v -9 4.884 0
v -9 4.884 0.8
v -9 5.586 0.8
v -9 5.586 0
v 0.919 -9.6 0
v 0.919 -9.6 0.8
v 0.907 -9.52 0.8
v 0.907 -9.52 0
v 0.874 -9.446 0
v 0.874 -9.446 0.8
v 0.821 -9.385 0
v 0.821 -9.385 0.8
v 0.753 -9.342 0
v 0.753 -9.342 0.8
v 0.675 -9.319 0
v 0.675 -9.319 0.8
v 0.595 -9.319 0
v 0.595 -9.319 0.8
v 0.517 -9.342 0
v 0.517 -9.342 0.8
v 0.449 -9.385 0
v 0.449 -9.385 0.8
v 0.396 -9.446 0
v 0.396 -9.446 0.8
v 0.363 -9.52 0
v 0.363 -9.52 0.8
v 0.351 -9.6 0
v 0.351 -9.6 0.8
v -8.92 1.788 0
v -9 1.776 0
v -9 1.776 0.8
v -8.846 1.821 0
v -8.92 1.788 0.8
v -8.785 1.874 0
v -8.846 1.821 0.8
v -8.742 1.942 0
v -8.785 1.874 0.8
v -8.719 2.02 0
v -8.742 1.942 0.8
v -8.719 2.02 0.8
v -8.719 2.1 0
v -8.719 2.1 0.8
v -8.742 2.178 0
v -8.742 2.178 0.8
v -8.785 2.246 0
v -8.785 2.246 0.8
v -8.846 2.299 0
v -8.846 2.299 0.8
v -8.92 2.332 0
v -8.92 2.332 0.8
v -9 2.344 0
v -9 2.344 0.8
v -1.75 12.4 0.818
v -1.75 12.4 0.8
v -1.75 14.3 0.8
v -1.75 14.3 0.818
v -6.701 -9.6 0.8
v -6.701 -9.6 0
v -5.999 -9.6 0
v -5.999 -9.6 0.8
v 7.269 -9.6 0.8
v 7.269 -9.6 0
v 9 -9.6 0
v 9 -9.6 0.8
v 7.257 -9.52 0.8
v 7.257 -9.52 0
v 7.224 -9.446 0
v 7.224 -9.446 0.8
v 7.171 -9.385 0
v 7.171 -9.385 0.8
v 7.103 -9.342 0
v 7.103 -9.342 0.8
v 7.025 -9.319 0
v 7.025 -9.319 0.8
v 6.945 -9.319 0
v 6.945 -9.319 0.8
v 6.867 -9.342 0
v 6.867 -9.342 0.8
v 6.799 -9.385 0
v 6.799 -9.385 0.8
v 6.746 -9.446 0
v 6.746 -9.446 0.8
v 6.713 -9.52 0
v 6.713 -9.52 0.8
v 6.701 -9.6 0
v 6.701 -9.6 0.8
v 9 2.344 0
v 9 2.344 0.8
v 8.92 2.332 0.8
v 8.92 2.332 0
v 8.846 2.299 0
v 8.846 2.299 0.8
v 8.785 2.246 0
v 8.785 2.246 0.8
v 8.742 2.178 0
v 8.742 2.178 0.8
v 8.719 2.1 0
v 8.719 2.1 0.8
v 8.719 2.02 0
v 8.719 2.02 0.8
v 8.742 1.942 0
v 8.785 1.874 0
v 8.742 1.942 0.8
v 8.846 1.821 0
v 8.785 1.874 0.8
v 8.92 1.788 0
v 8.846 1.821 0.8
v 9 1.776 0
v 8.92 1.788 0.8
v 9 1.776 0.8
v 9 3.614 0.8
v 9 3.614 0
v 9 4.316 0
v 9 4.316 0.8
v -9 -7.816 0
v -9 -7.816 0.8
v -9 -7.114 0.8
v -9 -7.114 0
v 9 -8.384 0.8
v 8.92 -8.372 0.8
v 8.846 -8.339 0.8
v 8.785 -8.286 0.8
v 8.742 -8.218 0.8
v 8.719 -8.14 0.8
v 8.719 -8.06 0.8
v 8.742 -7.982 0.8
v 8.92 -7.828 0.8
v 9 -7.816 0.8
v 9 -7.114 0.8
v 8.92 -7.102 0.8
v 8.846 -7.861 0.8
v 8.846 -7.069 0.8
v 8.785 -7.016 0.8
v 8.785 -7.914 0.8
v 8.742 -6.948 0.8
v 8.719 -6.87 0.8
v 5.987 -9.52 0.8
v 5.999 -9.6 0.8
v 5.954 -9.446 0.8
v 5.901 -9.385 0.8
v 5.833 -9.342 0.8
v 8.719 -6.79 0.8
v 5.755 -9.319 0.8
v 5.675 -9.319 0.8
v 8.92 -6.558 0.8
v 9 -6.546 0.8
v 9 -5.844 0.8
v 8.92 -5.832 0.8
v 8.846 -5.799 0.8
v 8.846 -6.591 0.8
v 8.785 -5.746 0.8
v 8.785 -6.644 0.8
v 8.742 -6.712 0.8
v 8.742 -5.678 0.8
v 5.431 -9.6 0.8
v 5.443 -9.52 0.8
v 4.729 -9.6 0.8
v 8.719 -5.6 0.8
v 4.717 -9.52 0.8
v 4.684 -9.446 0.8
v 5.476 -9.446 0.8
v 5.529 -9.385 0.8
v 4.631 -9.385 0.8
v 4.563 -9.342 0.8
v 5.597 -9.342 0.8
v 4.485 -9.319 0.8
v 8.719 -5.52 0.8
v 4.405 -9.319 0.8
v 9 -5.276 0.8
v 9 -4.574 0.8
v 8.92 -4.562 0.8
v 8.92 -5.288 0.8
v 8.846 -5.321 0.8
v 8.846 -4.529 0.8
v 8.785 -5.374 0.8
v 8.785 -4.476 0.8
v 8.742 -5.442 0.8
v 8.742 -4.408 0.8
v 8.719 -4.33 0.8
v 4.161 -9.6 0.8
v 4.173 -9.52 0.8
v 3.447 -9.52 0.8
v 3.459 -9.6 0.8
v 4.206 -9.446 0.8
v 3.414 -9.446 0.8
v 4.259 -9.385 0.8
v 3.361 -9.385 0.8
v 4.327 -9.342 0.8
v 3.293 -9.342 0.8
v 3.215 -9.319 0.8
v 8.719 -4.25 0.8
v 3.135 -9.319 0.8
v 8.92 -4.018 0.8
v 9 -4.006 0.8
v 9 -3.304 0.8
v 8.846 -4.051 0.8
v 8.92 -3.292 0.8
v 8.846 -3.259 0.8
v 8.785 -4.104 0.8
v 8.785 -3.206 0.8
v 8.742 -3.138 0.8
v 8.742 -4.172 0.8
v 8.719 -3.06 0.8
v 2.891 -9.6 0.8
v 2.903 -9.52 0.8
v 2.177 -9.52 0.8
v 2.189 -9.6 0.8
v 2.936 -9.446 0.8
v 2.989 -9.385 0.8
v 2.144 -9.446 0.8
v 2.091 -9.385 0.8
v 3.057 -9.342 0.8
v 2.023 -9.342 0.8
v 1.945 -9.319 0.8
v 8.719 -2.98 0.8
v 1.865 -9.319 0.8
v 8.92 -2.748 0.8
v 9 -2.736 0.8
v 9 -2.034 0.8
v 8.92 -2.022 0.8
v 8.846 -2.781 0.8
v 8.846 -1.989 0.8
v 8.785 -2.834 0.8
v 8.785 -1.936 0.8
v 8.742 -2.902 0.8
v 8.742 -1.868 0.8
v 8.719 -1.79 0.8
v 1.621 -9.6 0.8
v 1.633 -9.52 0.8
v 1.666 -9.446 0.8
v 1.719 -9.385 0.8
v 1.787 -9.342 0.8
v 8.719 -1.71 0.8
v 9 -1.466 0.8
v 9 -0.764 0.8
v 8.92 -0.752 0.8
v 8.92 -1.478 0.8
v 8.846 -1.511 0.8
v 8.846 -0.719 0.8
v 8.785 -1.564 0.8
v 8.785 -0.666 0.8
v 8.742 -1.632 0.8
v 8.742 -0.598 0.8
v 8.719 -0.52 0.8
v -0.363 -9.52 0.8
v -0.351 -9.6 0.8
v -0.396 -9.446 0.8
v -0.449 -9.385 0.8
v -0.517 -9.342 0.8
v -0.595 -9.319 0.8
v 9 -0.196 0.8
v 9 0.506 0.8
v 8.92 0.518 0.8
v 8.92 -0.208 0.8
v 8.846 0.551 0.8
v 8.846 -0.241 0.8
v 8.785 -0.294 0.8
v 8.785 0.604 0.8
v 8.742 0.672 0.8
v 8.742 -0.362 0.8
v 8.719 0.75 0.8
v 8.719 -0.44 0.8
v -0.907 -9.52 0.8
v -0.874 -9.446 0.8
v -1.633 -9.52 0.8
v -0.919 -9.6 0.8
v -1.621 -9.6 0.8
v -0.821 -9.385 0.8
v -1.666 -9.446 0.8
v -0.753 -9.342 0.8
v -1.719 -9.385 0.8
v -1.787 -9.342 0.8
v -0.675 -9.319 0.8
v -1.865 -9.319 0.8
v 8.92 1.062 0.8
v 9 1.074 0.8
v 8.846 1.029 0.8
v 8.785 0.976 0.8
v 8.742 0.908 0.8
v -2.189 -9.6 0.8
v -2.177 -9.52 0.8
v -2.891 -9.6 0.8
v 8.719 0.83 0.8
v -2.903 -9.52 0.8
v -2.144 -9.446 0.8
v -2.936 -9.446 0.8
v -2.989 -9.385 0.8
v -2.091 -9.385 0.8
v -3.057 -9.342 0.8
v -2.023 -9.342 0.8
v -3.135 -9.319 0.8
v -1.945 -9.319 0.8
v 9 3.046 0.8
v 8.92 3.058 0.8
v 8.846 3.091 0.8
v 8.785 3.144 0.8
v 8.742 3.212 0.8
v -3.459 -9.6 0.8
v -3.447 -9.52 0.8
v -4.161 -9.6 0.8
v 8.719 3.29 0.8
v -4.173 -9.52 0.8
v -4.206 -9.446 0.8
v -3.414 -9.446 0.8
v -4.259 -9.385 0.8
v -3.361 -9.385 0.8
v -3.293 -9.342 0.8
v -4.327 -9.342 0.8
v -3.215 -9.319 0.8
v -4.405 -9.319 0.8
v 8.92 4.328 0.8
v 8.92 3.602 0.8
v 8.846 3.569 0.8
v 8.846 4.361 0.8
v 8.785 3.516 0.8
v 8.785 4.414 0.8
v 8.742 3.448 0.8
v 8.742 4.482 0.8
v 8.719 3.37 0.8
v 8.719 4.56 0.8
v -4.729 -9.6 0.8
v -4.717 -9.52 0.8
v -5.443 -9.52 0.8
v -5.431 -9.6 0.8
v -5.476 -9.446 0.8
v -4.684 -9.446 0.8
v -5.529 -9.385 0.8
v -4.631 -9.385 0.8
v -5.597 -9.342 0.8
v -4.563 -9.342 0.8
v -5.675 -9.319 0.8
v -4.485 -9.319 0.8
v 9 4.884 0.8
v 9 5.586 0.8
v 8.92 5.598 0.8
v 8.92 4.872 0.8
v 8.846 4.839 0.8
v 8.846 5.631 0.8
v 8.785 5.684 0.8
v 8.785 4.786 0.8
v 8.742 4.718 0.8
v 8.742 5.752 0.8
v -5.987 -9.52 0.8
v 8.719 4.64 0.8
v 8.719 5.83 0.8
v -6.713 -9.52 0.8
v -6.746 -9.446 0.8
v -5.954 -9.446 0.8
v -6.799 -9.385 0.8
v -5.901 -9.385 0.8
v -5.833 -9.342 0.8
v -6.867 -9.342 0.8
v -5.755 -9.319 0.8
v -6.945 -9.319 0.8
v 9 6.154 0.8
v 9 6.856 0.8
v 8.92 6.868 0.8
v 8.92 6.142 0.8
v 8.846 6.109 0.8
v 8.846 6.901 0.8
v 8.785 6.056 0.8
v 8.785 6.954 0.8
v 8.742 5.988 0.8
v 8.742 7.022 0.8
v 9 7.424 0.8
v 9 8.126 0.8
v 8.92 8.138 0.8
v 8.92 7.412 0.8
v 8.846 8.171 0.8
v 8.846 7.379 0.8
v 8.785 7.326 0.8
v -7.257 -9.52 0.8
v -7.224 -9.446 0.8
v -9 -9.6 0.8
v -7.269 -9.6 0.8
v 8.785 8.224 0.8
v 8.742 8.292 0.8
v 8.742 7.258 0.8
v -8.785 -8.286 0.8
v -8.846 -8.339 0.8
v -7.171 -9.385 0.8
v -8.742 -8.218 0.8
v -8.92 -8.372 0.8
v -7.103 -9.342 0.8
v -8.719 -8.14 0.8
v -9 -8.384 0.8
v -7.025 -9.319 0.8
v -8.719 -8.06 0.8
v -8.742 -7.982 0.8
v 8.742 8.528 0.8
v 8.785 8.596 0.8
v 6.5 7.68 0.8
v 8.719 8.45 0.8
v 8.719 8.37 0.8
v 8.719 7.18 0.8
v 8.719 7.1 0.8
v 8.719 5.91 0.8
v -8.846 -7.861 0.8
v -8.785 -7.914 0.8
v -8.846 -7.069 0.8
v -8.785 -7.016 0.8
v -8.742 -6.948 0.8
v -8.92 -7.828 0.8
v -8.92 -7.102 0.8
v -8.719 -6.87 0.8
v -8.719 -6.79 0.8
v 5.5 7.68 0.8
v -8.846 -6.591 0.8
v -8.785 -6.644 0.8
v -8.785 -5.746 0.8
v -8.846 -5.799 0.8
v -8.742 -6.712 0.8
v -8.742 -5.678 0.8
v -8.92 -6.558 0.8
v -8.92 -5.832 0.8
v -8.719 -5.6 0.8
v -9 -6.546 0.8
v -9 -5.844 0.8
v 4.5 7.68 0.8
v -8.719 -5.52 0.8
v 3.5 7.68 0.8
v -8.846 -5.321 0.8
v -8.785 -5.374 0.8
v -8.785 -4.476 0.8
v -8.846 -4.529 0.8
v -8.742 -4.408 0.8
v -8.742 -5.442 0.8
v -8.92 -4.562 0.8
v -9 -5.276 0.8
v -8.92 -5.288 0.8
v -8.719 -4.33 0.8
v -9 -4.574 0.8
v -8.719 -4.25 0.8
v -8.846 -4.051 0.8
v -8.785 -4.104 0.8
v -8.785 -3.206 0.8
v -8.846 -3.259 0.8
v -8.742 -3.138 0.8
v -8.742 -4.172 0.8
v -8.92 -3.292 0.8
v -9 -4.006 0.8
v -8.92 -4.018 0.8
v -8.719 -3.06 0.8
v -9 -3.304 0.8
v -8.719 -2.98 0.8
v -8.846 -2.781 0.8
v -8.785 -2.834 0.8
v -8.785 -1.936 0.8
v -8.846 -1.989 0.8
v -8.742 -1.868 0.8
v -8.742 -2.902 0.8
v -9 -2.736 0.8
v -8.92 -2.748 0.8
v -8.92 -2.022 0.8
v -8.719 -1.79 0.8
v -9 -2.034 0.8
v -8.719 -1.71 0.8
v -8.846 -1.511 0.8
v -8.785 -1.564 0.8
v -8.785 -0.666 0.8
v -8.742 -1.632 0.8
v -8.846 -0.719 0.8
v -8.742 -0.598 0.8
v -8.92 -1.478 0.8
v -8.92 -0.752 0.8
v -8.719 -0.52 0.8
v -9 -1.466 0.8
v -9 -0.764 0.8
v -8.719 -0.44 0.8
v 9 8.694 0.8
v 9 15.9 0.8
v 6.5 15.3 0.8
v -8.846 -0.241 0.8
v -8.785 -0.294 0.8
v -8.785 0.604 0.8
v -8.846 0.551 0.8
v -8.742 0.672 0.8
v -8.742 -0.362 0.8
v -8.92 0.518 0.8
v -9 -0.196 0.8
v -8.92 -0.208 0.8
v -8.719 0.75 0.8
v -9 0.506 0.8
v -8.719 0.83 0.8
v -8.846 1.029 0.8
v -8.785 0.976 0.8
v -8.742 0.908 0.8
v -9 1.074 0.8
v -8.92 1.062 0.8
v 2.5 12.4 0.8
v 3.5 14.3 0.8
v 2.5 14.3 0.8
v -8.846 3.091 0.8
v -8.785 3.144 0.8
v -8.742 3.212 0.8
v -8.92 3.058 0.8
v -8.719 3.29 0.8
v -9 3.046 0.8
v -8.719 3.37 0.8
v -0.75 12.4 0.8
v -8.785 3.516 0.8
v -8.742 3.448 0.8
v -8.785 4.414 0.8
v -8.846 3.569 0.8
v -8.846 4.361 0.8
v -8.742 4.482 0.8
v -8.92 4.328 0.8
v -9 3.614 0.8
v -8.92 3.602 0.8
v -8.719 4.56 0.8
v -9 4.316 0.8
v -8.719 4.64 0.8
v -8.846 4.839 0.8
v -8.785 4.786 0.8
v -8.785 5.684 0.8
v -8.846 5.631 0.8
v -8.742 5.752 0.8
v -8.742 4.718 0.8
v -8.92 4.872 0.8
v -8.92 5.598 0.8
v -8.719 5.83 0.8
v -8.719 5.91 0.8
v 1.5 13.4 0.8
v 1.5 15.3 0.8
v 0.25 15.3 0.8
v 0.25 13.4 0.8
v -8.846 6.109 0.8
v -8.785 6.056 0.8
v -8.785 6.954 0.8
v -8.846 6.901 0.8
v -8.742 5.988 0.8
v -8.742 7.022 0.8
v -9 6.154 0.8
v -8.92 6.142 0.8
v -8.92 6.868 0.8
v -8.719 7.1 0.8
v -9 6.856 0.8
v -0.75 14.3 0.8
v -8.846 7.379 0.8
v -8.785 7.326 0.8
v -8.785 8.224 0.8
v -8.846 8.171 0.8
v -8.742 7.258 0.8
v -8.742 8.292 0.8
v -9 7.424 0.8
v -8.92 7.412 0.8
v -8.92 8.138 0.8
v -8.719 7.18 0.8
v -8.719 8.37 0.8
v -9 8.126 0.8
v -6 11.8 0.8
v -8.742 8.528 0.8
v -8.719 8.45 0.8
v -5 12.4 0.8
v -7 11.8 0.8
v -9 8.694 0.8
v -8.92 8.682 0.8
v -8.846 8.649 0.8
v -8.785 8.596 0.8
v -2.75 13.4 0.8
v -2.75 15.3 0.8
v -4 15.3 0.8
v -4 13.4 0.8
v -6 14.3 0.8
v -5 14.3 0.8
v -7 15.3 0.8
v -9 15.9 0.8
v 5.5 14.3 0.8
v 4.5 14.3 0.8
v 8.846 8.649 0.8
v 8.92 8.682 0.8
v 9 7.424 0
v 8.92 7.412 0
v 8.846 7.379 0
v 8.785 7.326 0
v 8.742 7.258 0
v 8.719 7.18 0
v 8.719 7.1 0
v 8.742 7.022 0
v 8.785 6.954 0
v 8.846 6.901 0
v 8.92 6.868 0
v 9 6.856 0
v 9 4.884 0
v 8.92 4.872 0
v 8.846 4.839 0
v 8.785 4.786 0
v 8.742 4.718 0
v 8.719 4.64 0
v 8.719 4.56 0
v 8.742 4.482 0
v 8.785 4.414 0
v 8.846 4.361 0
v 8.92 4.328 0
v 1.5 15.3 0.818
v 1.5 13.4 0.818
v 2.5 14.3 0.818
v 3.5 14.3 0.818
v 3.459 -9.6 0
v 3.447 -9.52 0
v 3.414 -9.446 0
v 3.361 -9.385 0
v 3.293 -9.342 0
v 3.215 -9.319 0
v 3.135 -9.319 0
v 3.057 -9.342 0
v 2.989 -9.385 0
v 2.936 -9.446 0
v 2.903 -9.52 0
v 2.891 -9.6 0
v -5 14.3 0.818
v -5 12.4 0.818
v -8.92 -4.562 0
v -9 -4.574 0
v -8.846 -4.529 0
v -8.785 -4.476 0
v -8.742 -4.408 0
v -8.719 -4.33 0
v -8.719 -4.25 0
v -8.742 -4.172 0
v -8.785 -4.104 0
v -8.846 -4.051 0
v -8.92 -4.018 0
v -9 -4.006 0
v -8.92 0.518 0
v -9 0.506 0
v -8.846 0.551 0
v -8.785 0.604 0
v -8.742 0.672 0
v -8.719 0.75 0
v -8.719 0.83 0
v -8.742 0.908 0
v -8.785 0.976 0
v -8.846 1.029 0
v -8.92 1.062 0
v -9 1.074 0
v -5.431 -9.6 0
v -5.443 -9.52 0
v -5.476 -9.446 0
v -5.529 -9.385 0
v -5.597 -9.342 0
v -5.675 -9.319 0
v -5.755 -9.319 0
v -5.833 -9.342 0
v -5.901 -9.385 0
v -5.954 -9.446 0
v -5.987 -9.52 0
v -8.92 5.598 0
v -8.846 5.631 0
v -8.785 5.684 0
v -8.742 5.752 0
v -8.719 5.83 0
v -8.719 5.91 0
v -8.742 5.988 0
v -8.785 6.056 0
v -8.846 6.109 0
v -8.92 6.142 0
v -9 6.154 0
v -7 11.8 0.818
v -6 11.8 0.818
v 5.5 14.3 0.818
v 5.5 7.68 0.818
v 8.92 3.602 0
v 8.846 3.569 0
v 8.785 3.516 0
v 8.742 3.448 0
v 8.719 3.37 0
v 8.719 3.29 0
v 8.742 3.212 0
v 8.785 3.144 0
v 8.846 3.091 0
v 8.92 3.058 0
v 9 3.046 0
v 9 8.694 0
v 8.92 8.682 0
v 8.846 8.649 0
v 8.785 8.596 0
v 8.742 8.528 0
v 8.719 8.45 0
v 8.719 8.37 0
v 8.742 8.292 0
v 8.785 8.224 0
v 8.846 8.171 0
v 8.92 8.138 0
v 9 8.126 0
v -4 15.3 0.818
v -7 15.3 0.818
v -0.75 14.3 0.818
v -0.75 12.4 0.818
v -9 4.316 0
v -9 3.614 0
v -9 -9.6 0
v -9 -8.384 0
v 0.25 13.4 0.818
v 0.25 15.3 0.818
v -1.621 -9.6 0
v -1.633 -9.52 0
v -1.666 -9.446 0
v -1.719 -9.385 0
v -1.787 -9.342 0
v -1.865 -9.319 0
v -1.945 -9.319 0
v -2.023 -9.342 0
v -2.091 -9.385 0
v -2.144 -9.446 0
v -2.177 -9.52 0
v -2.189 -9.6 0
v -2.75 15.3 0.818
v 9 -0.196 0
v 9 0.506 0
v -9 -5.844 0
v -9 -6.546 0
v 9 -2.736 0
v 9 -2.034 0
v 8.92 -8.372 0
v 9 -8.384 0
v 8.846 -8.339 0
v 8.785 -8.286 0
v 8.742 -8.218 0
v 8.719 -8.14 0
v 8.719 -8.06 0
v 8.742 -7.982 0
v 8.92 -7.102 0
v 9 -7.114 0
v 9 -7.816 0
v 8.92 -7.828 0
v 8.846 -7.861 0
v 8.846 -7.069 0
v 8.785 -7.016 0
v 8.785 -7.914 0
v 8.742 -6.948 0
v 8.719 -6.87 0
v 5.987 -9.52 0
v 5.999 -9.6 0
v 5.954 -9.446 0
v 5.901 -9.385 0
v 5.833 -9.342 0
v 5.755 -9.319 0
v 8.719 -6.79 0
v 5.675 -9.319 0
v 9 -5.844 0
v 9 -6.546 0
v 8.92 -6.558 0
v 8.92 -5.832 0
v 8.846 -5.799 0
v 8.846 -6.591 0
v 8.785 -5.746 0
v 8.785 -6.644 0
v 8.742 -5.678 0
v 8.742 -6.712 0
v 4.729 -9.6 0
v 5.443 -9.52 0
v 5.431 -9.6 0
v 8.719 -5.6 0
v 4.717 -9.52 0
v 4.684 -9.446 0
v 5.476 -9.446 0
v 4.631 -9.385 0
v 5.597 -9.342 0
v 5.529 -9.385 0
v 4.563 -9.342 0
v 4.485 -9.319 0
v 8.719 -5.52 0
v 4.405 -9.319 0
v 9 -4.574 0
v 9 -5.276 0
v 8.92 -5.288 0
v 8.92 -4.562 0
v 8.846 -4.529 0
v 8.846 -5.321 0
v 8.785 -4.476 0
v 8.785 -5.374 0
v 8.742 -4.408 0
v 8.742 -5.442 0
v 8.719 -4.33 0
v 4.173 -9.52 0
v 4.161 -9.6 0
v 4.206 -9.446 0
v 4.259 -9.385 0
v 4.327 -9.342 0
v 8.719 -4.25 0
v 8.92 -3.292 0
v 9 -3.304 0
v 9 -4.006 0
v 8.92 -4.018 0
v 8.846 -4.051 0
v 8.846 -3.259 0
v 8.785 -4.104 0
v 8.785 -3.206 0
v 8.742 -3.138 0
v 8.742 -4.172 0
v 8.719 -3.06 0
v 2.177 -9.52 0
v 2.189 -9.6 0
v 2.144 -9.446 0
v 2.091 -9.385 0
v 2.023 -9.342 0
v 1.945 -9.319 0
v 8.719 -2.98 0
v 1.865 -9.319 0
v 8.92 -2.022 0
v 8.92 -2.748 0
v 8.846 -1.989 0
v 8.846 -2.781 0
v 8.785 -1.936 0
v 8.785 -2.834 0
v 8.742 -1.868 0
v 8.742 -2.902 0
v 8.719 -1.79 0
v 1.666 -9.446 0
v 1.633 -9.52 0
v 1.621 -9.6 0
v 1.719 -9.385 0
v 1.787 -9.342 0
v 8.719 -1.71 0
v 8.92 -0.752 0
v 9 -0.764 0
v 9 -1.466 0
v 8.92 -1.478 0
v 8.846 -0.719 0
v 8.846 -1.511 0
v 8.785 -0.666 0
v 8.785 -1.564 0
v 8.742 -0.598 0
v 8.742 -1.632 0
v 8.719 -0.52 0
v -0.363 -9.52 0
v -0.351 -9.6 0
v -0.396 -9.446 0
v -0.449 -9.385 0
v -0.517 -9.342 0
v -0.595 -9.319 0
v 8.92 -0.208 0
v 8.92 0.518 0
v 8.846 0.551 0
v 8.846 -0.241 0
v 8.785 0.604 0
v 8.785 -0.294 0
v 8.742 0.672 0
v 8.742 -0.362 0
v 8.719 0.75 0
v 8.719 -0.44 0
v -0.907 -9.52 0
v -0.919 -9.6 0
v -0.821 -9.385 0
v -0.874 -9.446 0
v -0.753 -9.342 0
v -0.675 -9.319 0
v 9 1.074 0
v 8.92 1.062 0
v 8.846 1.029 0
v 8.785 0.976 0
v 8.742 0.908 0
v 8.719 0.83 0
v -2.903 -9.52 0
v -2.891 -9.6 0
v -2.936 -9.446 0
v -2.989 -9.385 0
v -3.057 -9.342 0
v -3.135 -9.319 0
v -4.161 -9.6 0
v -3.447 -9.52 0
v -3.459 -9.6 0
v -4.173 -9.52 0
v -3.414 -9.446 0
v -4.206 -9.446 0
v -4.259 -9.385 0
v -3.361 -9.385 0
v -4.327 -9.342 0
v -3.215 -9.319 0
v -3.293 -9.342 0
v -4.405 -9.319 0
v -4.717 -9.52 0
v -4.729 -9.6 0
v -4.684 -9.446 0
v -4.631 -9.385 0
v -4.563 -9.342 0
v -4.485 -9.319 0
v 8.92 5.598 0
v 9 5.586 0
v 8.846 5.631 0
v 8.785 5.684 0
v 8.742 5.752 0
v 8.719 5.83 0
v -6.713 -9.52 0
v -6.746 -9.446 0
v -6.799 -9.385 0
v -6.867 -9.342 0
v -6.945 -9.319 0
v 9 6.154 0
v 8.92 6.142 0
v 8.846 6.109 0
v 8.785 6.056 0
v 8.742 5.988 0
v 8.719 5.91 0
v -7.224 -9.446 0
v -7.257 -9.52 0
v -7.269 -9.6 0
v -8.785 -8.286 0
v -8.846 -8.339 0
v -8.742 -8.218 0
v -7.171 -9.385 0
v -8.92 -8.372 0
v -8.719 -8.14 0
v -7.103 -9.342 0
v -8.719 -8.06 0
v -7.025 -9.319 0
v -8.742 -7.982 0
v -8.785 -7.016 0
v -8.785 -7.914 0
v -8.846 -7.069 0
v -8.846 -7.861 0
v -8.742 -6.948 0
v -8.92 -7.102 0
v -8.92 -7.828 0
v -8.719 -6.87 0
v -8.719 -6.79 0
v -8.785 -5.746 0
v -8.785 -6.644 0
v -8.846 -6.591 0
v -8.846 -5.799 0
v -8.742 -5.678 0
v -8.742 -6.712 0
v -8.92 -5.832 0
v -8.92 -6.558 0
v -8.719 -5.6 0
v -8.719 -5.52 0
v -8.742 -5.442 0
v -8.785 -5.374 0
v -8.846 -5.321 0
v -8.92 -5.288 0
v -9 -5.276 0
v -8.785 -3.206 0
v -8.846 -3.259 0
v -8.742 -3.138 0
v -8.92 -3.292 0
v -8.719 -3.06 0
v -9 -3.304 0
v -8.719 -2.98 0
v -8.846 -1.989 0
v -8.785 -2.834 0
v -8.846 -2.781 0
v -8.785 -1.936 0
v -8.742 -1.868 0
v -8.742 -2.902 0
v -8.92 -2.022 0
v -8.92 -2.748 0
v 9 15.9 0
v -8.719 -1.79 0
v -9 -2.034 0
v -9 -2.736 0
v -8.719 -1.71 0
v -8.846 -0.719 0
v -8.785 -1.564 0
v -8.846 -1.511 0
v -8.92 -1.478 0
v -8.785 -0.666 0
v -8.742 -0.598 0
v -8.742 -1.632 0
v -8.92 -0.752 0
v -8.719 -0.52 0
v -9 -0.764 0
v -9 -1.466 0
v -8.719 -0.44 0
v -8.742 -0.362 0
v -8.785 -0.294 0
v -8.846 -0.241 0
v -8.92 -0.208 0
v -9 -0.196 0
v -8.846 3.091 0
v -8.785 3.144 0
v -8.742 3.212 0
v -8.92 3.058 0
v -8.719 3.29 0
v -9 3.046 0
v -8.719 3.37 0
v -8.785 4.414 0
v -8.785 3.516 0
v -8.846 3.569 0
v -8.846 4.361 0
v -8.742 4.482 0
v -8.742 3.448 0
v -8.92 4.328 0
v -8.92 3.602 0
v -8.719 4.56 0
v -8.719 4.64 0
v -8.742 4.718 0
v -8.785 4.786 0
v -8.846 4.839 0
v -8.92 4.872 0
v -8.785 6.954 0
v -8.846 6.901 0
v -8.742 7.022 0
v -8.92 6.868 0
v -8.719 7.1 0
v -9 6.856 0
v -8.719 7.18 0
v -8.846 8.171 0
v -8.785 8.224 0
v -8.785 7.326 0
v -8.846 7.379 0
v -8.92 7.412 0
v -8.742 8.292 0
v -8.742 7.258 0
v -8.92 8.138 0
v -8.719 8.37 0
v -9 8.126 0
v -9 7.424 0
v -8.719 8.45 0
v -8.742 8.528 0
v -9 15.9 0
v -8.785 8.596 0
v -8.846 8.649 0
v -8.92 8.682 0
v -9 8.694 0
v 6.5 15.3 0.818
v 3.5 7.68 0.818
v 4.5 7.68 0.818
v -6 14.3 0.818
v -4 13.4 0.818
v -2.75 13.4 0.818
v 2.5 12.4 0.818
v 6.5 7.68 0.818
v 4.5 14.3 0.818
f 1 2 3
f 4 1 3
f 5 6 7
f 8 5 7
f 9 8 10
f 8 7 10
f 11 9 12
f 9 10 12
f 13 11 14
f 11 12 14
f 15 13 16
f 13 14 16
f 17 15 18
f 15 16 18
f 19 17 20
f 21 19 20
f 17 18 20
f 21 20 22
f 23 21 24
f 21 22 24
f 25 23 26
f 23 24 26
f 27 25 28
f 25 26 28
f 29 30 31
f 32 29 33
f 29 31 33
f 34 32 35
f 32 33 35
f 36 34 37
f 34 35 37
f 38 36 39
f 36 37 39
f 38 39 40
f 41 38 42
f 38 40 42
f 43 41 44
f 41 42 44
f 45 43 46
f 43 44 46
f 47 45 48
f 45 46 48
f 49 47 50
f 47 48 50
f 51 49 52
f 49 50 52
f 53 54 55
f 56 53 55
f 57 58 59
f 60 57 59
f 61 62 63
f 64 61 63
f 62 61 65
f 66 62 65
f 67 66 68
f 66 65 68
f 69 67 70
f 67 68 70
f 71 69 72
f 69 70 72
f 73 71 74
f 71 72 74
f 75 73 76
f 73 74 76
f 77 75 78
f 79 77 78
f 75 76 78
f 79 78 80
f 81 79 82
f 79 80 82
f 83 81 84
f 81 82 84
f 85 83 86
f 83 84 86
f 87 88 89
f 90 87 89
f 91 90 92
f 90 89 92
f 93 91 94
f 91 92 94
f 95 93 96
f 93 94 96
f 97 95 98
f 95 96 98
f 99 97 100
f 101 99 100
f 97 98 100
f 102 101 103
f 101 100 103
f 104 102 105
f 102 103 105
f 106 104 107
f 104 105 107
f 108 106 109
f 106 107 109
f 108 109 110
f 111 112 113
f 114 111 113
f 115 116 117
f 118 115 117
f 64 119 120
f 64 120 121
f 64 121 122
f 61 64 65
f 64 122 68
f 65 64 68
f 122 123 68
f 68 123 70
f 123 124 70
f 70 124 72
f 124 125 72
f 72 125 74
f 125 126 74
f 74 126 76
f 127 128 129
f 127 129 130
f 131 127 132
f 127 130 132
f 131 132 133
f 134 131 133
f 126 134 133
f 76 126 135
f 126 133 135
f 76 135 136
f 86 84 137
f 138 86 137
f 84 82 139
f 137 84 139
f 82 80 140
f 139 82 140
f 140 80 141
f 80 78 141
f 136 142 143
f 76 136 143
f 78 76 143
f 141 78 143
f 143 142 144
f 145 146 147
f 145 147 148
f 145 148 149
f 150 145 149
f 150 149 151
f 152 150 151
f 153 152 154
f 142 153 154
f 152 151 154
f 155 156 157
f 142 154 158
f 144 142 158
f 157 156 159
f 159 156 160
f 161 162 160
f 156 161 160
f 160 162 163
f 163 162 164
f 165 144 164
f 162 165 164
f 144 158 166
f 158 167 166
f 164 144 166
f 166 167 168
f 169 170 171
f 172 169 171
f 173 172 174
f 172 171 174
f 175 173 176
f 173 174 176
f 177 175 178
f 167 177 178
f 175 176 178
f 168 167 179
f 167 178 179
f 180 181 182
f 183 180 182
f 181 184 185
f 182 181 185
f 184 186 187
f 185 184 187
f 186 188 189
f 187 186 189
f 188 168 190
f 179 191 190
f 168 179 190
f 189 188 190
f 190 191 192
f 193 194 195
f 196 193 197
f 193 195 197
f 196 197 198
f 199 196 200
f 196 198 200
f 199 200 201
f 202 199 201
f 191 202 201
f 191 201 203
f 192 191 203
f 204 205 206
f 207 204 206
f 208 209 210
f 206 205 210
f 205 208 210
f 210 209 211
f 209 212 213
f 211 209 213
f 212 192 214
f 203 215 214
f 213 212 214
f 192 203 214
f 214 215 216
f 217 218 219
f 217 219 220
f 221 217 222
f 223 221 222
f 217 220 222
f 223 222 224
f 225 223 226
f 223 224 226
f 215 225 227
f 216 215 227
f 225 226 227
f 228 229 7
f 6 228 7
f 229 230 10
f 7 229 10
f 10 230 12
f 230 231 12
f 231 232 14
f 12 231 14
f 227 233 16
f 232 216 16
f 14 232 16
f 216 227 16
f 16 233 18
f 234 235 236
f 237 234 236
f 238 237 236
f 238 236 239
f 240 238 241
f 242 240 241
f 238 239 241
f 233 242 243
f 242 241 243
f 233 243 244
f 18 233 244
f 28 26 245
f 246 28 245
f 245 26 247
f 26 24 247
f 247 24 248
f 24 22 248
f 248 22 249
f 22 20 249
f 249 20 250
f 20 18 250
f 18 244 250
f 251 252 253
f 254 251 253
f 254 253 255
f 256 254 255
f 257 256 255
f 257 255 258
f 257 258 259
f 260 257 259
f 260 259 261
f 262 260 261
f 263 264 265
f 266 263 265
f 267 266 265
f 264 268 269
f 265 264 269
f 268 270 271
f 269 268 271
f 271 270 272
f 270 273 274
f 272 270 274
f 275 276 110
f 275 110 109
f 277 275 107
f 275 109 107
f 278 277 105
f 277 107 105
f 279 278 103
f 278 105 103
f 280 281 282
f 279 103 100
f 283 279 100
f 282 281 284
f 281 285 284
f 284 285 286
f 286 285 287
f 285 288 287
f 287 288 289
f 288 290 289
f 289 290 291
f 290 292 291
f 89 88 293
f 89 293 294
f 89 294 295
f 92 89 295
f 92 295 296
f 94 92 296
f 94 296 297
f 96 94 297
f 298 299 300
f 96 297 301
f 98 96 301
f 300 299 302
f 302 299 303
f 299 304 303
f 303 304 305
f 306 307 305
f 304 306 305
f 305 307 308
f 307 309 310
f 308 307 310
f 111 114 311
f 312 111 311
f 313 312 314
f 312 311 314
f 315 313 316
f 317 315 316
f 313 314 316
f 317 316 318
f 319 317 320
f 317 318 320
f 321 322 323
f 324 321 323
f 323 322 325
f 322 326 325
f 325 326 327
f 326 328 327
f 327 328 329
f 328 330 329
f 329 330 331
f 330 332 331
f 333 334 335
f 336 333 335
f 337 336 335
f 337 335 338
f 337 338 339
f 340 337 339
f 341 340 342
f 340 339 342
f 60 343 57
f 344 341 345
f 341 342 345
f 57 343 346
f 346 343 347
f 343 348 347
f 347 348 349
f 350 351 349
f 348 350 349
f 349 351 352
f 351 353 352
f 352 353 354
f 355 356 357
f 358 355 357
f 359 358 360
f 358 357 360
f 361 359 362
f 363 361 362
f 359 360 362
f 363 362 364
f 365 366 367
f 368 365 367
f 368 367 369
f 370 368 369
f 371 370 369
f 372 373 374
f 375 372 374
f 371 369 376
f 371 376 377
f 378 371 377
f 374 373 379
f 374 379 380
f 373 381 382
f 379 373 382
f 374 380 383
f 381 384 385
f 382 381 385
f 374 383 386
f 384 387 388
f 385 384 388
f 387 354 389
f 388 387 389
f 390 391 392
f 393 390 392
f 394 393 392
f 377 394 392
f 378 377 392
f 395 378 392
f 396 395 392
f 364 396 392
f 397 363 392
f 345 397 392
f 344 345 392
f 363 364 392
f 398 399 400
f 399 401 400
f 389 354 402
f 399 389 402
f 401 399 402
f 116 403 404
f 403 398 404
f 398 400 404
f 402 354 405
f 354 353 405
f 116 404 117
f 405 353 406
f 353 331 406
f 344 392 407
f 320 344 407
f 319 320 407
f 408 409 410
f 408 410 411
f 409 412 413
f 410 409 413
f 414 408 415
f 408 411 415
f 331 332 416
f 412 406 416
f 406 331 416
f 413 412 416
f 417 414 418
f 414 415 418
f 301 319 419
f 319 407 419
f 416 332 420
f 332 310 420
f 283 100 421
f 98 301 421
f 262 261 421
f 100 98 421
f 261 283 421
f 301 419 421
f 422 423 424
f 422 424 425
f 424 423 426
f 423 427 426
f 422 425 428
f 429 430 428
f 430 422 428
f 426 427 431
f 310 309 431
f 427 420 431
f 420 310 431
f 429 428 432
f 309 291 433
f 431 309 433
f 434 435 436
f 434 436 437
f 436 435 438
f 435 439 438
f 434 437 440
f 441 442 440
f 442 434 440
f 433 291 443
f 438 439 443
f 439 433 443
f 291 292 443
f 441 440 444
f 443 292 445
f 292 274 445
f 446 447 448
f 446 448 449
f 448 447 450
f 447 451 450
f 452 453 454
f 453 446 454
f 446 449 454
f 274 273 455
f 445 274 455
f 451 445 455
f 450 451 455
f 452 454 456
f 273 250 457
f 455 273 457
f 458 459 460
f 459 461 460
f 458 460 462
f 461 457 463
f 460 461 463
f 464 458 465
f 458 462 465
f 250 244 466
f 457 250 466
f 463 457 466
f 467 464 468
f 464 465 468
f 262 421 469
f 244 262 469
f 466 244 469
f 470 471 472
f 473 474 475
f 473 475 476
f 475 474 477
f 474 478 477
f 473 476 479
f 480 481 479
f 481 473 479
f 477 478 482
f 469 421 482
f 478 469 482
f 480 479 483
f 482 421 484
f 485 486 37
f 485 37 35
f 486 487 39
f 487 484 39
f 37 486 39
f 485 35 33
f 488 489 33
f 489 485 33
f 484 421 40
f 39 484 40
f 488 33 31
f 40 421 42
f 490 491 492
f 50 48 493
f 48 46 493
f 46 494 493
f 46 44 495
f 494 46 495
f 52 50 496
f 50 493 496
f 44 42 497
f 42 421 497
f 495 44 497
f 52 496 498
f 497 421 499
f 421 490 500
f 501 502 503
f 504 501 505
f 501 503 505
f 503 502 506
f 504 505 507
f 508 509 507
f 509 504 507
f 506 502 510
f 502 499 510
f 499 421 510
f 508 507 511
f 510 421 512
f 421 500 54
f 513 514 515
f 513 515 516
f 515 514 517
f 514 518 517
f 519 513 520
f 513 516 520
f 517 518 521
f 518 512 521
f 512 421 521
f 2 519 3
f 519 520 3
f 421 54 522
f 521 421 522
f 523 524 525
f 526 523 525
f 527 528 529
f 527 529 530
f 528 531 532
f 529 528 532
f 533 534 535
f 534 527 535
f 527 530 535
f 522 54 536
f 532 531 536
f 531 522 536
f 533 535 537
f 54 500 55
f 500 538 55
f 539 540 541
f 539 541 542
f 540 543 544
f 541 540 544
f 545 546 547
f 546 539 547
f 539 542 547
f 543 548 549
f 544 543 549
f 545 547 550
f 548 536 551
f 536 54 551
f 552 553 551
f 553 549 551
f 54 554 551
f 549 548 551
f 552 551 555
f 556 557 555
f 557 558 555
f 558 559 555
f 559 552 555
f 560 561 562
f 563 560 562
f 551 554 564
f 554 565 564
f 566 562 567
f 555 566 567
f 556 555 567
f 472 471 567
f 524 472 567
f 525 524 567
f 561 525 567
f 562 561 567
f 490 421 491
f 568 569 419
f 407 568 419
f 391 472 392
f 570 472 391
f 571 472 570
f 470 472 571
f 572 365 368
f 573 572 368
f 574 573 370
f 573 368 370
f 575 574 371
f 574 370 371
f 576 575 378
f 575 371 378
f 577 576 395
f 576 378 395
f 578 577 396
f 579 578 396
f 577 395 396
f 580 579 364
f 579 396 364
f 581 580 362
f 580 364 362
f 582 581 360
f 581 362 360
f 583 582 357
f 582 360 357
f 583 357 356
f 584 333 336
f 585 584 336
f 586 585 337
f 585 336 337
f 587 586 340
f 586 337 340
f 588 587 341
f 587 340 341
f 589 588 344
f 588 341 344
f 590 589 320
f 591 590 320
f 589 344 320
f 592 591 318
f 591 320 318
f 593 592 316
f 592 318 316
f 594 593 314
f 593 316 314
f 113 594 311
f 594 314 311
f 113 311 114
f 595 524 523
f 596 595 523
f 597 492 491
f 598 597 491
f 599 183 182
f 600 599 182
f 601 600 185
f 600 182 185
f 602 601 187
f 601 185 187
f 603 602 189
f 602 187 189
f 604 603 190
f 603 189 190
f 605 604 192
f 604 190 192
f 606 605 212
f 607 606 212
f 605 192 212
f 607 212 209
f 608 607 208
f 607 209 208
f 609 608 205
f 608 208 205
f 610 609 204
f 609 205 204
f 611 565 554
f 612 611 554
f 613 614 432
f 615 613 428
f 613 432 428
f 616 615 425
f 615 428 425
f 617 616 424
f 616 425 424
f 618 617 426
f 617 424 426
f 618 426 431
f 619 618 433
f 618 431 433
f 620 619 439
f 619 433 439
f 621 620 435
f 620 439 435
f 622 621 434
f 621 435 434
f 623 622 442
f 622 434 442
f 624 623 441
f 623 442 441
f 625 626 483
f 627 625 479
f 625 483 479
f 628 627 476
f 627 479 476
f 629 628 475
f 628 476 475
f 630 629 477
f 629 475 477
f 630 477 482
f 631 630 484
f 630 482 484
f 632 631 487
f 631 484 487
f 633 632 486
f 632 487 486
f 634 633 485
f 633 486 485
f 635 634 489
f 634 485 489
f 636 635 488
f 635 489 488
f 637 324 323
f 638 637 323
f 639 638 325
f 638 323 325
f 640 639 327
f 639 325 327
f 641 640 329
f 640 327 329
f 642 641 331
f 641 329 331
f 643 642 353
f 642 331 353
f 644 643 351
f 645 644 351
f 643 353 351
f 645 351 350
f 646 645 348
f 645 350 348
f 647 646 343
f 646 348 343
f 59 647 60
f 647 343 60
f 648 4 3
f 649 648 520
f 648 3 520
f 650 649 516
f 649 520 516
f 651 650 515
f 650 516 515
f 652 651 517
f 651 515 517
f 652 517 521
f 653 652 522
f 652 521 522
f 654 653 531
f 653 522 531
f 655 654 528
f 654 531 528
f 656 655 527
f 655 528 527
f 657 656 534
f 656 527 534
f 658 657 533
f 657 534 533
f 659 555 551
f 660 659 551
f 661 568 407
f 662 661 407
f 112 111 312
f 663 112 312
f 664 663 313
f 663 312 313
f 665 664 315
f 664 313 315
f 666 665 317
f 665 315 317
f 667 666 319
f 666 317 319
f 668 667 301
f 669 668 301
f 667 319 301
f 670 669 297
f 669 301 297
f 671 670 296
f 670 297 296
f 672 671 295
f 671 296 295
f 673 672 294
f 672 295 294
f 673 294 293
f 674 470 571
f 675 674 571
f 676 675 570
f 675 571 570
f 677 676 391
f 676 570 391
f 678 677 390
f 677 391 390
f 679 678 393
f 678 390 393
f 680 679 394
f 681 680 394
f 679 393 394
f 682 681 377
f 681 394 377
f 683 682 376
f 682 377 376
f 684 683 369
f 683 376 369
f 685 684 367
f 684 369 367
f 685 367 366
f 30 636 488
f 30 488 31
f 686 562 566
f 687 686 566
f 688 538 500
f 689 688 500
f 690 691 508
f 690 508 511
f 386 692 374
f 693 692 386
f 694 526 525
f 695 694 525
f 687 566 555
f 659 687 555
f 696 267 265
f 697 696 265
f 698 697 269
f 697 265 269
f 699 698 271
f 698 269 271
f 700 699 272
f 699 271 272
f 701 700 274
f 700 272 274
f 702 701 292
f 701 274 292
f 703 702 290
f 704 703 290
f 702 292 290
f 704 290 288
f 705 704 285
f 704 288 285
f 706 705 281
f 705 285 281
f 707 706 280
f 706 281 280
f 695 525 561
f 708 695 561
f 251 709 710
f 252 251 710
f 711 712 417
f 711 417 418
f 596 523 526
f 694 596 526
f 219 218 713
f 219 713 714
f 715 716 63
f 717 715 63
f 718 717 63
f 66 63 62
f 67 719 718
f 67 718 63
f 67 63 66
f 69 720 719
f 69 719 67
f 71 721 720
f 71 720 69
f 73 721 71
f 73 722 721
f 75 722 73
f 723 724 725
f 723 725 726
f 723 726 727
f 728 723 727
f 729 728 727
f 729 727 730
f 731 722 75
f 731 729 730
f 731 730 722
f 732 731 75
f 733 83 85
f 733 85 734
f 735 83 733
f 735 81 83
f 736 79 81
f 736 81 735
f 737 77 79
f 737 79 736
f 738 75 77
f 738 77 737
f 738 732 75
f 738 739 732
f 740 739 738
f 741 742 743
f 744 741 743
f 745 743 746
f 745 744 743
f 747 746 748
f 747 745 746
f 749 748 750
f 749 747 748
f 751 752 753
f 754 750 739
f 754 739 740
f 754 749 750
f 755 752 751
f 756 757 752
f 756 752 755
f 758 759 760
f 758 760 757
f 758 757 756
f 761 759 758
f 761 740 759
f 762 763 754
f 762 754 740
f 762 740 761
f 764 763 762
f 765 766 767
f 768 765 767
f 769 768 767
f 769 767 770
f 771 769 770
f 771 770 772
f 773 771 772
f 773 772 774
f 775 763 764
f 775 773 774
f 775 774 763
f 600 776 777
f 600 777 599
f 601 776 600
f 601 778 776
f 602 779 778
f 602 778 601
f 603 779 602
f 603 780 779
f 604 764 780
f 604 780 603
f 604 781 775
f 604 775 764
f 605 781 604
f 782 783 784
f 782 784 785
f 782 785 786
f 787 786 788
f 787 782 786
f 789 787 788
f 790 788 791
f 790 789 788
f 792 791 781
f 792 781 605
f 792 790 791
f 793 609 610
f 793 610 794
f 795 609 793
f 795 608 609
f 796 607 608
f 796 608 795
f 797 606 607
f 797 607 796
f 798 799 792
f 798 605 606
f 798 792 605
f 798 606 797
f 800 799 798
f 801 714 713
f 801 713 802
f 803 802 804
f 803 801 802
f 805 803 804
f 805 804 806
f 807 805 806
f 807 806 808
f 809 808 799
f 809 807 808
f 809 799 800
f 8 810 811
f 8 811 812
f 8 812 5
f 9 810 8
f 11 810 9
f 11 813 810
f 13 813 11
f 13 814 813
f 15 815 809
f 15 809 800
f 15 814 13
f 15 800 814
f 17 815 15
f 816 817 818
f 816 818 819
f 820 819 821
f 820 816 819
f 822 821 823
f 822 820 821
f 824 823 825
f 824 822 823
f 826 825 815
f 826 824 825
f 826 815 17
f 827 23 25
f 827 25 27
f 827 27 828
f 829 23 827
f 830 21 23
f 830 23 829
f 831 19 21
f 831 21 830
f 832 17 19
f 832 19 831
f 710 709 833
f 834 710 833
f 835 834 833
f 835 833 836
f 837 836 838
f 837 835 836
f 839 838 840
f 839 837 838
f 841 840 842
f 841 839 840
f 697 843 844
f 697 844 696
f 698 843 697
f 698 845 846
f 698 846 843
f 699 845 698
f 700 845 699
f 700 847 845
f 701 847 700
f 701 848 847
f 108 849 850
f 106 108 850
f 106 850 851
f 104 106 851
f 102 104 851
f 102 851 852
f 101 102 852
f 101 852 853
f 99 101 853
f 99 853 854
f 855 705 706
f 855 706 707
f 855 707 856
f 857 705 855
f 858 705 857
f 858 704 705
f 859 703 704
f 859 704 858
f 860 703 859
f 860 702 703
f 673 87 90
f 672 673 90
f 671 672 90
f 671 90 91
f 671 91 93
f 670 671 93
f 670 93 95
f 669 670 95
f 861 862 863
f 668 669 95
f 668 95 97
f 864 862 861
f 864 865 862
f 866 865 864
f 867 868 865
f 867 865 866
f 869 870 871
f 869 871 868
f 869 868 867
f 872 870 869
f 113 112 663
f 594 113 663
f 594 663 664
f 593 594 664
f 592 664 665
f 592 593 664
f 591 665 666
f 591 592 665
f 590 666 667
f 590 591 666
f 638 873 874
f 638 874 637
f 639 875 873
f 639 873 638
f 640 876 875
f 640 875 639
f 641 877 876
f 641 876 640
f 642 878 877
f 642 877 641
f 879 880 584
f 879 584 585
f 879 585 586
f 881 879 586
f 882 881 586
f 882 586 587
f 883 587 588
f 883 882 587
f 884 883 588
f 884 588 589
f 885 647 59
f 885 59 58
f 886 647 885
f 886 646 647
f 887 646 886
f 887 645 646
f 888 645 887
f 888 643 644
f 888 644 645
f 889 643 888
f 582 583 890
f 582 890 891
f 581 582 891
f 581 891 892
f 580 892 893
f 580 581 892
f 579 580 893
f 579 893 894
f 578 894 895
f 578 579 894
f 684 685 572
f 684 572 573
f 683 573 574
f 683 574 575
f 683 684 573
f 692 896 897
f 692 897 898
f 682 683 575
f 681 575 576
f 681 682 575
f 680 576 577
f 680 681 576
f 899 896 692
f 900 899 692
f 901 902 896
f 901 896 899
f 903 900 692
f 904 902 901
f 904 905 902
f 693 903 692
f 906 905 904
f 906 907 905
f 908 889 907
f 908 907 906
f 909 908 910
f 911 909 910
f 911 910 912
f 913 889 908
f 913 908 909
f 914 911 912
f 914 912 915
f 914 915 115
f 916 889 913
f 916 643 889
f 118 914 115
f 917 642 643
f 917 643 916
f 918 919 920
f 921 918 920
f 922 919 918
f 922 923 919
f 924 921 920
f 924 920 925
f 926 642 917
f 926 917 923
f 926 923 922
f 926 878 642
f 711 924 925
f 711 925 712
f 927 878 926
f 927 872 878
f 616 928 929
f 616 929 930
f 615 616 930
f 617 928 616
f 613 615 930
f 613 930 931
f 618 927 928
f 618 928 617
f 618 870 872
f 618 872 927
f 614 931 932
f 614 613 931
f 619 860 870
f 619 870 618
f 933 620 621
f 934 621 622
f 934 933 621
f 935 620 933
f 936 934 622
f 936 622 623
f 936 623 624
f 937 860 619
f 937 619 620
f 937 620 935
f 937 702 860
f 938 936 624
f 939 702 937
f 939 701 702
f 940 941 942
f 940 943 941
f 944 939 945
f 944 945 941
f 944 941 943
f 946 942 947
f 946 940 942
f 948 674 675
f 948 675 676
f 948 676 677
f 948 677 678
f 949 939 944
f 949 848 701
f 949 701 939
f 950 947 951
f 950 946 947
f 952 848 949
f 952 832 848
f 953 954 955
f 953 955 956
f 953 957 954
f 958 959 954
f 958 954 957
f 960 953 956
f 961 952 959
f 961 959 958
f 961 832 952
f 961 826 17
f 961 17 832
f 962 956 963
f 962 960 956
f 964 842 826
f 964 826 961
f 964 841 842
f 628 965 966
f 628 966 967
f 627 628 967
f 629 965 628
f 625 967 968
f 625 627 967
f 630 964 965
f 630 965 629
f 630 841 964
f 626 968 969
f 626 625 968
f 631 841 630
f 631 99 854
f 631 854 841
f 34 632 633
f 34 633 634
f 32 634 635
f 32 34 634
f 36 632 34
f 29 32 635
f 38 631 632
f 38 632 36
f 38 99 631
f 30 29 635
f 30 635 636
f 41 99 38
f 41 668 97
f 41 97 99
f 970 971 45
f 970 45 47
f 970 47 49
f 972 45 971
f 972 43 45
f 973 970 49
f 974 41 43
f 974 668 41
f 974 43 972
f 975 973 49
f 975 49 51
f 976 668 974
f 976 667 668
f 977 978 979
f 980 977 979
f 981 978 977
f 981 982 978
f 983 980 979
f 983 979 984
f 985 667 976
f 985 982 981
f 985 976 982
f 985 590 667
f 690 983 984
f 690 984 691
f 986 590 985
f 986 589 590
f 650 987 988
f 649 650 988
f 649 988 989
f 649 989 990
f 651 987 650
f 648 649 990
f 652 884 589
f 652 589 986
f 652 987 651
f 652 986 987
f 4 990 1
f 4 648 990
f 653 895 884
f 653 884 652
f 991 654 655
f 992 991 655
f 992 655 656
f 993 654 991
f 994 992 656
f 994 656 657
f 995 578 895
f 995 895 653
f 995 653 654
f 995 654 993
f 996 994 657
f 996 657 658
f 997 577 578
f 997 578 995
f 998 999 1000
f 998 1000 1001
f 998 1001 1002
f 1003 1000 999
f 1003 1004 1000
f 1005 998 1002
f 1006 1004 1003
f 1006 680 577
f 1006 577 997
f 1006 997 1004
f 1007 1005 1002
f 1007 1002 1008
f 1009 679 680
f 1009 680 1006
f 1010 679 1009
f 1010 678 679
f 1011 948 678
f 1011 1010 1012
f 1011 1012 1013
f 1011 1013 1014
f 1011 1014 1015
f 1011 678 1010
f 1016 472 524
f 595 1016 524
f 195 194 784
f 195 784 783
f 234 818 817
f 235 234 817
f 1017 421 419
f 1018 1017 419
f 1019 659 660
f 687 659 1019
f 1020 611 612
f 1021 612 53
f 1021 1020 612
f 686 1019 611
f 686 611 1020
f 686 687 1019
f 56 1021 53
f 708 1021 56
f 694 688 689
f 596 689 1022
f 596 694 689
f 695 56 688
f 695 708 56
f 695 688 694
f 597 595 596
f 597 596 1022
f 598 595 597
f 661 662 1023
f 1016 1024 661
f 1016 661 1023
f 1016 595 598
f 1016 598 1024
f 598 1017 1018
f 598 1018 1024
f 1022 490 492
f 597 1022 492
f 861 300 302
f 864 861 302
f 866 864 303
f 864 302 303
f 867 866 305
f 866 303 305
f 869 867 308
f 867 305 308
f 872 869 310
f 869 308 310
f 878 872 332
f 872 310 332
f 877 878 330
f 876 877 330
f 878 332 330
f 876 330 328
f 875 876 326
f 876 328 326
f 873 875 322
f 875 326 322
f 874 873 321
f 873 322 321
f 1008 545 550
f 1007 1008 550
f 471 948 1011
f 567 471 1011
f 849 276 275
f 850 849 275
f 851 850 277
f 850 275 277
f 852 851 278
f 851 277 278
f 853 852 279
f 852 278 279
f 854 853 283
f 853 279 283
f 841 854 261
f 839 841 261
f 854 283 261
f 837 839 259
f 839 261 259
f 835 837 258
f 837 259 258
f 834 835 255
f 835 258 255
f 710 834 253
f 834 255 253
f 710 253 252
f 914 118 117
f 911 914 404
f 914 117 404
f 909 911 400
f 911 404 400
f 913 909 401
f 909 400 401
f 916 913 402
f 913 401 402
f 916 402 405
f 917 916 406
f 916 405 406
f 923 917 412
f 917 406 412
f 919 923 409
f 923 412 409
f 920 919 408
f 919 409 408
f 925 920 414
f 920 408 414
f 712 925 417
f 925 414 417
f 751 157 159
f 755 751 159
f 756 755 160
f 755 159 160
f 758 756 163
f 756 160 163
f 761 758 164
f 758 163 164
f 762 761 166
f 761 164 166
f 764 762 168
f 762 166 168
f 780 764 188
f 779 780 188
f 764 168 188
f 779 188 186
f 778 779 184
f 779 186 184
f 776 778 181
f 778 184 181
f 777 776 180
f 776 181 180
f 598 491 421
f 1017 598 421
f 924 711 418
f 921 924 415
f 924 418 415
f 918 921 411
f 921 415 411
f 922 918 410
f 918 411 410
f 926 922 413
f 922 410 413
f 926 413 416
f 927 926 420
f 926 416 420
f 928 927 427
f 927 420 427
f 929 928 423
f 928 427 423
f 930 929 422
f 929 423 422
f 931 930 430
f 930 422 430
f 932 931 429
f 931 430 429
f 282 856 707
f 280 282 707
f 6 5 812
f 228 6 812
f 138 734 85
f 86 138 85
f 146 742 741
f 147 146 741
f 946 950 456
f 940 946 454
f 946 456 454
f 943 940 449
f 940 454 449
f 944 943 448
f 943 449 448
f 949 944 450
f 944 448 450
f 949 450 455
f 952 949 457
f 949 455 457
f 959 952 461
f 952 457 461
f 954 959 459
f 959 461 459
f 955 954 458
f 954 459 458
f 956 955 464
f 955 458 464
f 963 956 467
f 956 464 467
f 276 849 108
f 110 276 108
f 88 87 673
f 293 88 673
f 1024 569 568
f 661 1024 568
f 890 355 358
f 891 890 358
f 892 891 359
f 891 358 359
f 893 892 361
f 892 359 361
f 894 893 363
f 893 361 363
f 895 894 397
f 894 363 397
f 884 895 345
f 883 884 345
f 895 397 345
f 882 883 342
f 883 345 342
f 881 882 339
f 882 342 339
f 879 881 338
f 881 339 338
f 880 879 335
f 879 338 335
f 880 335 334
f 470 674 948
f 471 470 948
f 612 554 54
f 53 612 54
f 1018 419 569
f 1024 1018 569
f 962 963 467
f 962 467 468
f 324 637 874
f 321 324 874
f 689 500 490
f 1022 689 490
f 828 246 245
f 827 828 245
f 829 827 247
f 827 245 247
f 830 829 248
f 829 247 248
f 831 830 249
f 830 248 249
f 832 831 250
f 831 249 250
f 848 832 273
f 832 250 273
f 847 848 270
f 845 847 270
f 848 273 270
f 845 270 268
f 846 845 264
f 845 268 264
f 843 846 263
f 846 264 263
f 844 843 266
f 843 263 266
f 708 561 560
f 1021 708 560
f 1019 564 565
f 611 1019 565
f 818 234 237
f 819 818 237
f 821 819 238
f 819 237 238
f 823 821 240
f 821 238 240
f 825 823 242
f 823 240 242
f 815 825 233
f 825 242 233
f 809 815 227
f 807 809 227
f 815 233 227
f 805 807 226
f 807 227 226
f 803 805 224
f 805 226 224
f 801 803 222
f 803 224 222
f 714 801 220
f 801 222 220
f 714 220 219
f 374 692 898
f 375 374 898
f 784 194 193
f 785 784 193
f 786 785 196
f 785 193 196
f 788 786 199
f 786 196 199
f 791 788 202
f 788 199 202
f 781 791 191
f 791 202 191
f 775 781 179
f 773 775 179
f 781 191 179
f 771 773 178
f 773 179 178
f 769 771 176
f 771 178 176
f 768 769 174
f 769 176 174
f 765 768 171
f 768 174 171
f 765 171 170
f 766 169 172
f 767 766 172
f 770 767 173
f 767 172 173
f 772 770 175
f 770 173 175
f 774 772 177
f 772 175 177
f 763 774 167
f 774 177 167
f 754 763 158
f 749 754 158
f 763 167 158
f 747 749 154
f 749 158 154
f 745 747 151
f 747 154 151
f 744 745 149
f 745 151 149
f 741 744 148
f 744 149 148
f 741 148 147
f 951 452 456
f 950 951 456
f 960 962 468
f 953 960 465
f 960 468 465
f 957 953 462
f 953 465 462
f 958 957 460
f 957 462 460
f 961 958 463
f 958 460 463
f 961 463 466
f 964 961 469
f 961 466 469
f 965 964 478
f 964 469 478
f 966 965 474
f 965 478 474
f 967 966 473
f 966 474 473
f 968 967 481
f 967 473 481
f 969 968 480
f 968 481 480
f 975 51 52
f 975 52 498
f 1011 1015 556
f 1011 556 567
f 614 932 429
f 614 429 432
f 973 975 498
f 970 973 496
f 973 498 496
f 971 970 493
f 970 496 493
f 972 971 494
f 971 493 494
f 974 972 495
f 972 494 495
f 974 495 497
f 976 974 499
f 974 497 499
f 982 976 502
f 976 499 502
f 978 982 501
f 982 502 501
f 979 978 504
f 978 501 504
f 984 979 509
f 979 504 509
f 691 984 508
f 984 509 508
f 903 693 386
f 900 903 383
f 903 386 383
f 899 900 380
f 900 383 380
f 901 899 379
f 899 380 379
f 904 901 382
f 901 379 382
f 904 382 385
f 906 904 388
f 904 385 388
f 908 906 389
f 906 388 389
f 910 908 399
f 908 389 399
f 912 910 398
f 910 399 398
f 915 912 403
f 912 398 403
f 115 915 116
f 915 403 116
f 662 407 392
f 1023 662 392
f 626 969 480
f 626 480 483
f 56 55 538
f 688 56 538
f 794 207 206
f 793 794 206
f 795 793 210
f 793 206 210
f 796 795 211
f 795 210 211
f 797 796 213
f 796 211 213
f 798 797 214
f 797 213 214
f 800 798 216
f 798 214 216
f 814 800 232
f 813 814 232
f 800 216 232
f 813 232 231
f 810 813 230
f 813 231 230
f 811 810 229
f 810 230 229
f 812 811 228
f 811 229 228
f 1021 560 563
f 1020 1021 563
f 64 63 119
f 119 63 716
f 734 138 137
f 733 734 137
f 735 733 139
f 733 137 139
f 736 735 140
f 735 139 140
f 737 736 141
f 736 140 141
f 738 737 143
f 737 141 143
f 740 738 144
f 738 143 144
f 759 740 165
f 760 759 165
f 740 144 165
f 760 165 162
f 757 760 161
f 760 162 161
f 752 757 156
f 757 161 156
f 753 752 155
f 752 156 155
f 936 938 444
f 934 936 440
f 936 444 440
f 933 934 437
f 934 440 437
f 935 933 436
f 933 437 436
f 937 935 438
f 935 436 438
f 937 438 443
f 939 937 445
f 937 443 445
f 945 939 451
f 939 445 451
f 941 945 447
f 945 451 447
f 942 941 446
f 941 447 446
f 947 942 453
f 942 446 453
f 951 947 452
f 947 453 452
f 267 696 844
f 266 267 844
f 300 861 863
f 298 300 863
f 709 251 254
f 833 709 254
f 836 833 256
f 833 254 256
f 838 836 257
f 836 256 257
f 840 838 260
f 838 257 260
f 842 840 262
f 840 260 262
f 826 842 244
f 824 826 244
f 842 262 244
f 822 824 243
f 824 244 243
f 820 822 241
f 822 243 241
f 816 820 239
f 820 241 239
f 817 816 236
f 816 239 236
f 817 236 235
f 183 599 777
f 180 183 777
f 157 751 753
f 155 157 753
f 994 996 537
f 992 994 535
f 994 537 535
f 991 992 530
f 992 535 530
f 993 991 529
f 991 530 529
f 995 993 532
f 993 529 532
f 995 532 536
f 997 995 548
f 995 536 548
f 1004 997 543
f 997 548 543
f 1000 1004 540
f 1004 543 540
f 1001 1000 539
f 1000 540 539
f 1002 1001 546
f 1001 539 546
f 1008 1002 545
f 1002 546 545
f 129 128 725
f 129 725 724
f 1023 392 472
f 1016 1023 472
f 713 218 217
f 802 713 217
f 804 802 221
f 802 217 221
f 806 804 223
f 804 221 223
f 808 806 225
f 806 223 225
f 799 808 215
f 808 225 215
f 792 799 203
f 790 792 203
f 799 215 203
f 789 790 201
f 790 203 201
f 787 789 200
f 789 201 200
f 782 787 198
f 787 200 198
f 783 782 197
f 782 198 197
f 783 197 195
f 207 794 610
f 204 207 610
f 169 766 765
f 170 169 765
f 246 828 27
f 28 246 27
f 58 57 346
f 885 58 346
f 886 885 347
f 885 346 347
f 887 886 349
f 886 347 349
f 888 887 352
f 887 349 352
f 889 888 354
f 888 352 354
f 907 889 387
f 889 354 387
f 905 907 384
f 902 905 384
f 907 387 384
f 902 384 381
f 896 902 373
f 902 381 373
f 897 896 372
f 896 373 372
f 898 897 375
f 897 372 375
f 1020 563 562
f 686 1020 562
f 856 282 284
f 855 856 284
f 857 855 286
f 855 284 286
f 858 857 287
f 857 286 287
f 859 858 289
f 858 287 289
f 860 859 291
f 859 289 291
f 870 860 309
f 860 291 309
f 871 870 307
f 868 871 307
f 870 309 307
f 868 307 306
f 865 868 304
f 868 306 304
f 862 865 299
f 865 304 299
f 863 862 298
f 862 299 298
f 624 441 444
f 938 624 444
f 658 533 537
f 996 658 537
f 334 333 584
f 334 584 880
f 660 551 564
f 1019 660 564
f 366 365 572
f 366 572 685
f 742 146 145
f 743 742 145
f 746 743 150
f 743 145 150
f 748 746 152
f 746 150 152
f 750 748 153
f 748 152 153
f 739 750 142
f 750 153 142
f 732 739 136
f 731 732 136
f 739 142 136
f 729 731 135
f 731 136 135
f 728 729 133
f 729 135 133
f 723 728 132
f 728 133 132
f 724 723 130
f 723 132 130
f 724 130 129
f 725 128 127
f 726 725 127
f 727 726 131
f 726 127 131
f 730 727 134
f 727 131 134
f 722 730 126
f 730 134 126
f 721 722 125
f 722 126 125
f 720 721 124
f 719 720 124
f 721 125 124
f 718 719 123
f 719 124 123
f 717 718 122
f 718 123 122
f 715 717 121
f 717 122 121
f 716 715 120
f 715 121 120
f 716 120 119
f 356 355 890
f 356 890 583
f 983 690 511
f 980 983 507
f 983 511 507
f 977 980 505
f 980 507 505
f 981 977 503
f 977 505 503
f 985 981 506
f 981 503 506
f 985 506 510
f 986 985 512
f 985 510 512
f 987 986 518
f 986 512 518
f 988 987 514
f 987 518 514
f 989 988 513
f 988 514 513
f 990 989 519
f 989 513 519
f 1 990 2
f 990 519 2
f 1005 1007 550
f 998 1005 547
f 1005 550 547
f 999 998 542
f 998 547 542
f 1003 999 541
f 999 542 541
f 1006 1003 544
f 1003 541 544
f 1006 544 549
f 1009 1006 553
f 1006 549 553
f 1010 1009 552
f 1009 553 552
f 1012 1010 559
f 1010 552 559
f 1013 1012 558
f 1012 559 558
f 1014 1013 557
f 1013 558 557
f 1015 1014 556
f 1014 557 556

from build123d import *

# Parameters (mm, degrees)
SKICA1_W             = 18
SKICA1_H             = 19.2
BODY_SMALL_DEPTH     = 0.8
SKICA2_W             = 18
SKICA2_H             = 6.3
BODY_EXTENSION_DEPTH = 0.8
SKICA3_R             = 0.284
VIAS_DEPTH           = 19.287974191
ANTENNA_DEPTH        = 0.018


with BuildPart() as part:
    # Skica1 → body_small (new body)
    with BuildSketch(Plane.XY):
        Rectangle(SKICA1_W, SKICA1_H)
    extrude(amount=BODY_SMALL_DEPTH)

    # Skica2 → body_extension (add)
    with BuildSketch(Plane(origin=(0, 0, 0), x_dir=(-1, 0, 0), z_dir=(0, 0, -1))):
        with Locations((0, 12.75)):
            Rectangle(SKICA2_W, SKICA2_H)
    extrude(amount=-BODY_EXTENSION_DEPTH)

    # Skica3 → vias (cut, through all)
    with BuildSketch(Plane.XY.offset(0.8)):
        with Locations((-6.985, -9.6)):
            Circle(SKICA3_R)
        with Locations((-9, -8.1)):
            Circle(SKICA3_R)
        with Locations((9, -8.1)):
            Circle(SKICA3_R)
        with Locations((-9, -6.83)):
            Circle(SKICA3_R)
        with Locations((9, -6.83)):
            Circle(SKICA3_R)
        with Locations((-9, -5.56)):
            Circle(SKICA3_R)
        with Locations((9, -5.56)):
            Circle(SKICA3_R)
        with Locations((-9, -4.29)):
            Circle(SKICA3_R)
        with Locations((9, -4.29)):
            Circle(SKICA3_R)
        with Locations((-9, -3.02)):
            Circle(SKICA3_R)
        with Locations((9, -3.02)):
            Circle(SKICA3_R)
        with Locations((-9, -1.75)):
            Circle(SKICA3_R)
        with Locations((9, -1.75)):
            Circle(SKICA3_R)
        with Locations((-9, -0.48)):
            Circle(SKICA3_R)
        with Locations((9, -0.48)):
            Circle(SKICA3_R)
        with Locations((-9, 0.79)):
            Circle(SKICA3_R)
        with Locations((9, 0.79)):
            Circle(SKICA3_R)
        with Locations((-9, 2.06)):
            Circle(SKICA3_R)
        with Locations((9, 2.06)):
            Circle(SKICA3_R)
        with Locations((-9, 3.33)):
            Circle(SKICA3_R)
        with Locations((9, 3.33)):
            Circle(SKICA3_R)
        with Locations((-9, 4.6)):
            Circle(SKICA3_R)
        with Locations((9, 4.6)):
            Circle(SKICA3_R)
        with Locations((-9, 5.87)):
            Circle(SKICA3_R)
        with Locations((9, 5.87)):
            Circle(SKICA3_R)
        with Locations((-9, 7.14)):
            Circle(SKICA3_R)
        with Locations((9, 7.14)):
            Circle(SKICA3_R)
        with Locations((-9, 8.41)):
            Circle(SKICA3_R)
        with Locations((9, 8.41)):
            Circle(SKICA3_R)
        with Locations((-5.715, -9.6)):
            Circle(SKICA3_R)
        with Locations((-4.445, -9.6)):
            Circle(SKICA3_R)
        with Locations((-3.175, -9.6)):
            Circle(SKICA3_R)
        with Locations((-1.905, -9.6)):
            Circle(SKICA3_R)
        with Locations((-0.635, -9.6)):
            Circle(SKICA3_R)
        with Locations((0.635, -9.6)):
            Circle(SKICA3_R)
        with Locations((1.905, -9.6)):
            Circle(SKICA3_R)
        with Locations((3.175, -9.6)):
            Circle(SKICA3_R)
        with Locations((4.445, -9.6)):
            Circle(SKICA3_R)
        with Locations((5.715, -9.6)):
            Circle(SKICA3_R)
        with Locations((6.985, -9.6)):
            Circle(SKICA3_R)
    extrude(amount=-VIAS_DEPTH, mode=Mode.SUBTRACT)

    # Skica4 → antenna (add)
    with BuildSketch(Plane.XY.offset(0.8)):
        Polygon((-7, 11.8), (-6, 11.8), (-6, 14.3), (-5, 14.3), (-5, 12.4), (-1.75, 12.4), (-1.75, 14.3), (-0.75, 14.3), (-0.75, 12.4), (2.5, 12.4), (2.5, 14.3), (3.5, 14.3), (3.5, 7.68), (4.5, 7.68), (4.5, 14.3), (5.5, 14.3), (5.5, 7.68), (6.5, 7.68), (6.5, 15.3), (1.5, 15.3), (1.5, 13.4), (0.25, 13.4), (0.25, 15.3), (-2.75, 15.3), (-2.75, 13.4), (-4, 13.4), (-4, 15.3), (-7, 15.3), align=None)
    extrude(amount=ANTENNA_DEPTH)


solid = part.part
